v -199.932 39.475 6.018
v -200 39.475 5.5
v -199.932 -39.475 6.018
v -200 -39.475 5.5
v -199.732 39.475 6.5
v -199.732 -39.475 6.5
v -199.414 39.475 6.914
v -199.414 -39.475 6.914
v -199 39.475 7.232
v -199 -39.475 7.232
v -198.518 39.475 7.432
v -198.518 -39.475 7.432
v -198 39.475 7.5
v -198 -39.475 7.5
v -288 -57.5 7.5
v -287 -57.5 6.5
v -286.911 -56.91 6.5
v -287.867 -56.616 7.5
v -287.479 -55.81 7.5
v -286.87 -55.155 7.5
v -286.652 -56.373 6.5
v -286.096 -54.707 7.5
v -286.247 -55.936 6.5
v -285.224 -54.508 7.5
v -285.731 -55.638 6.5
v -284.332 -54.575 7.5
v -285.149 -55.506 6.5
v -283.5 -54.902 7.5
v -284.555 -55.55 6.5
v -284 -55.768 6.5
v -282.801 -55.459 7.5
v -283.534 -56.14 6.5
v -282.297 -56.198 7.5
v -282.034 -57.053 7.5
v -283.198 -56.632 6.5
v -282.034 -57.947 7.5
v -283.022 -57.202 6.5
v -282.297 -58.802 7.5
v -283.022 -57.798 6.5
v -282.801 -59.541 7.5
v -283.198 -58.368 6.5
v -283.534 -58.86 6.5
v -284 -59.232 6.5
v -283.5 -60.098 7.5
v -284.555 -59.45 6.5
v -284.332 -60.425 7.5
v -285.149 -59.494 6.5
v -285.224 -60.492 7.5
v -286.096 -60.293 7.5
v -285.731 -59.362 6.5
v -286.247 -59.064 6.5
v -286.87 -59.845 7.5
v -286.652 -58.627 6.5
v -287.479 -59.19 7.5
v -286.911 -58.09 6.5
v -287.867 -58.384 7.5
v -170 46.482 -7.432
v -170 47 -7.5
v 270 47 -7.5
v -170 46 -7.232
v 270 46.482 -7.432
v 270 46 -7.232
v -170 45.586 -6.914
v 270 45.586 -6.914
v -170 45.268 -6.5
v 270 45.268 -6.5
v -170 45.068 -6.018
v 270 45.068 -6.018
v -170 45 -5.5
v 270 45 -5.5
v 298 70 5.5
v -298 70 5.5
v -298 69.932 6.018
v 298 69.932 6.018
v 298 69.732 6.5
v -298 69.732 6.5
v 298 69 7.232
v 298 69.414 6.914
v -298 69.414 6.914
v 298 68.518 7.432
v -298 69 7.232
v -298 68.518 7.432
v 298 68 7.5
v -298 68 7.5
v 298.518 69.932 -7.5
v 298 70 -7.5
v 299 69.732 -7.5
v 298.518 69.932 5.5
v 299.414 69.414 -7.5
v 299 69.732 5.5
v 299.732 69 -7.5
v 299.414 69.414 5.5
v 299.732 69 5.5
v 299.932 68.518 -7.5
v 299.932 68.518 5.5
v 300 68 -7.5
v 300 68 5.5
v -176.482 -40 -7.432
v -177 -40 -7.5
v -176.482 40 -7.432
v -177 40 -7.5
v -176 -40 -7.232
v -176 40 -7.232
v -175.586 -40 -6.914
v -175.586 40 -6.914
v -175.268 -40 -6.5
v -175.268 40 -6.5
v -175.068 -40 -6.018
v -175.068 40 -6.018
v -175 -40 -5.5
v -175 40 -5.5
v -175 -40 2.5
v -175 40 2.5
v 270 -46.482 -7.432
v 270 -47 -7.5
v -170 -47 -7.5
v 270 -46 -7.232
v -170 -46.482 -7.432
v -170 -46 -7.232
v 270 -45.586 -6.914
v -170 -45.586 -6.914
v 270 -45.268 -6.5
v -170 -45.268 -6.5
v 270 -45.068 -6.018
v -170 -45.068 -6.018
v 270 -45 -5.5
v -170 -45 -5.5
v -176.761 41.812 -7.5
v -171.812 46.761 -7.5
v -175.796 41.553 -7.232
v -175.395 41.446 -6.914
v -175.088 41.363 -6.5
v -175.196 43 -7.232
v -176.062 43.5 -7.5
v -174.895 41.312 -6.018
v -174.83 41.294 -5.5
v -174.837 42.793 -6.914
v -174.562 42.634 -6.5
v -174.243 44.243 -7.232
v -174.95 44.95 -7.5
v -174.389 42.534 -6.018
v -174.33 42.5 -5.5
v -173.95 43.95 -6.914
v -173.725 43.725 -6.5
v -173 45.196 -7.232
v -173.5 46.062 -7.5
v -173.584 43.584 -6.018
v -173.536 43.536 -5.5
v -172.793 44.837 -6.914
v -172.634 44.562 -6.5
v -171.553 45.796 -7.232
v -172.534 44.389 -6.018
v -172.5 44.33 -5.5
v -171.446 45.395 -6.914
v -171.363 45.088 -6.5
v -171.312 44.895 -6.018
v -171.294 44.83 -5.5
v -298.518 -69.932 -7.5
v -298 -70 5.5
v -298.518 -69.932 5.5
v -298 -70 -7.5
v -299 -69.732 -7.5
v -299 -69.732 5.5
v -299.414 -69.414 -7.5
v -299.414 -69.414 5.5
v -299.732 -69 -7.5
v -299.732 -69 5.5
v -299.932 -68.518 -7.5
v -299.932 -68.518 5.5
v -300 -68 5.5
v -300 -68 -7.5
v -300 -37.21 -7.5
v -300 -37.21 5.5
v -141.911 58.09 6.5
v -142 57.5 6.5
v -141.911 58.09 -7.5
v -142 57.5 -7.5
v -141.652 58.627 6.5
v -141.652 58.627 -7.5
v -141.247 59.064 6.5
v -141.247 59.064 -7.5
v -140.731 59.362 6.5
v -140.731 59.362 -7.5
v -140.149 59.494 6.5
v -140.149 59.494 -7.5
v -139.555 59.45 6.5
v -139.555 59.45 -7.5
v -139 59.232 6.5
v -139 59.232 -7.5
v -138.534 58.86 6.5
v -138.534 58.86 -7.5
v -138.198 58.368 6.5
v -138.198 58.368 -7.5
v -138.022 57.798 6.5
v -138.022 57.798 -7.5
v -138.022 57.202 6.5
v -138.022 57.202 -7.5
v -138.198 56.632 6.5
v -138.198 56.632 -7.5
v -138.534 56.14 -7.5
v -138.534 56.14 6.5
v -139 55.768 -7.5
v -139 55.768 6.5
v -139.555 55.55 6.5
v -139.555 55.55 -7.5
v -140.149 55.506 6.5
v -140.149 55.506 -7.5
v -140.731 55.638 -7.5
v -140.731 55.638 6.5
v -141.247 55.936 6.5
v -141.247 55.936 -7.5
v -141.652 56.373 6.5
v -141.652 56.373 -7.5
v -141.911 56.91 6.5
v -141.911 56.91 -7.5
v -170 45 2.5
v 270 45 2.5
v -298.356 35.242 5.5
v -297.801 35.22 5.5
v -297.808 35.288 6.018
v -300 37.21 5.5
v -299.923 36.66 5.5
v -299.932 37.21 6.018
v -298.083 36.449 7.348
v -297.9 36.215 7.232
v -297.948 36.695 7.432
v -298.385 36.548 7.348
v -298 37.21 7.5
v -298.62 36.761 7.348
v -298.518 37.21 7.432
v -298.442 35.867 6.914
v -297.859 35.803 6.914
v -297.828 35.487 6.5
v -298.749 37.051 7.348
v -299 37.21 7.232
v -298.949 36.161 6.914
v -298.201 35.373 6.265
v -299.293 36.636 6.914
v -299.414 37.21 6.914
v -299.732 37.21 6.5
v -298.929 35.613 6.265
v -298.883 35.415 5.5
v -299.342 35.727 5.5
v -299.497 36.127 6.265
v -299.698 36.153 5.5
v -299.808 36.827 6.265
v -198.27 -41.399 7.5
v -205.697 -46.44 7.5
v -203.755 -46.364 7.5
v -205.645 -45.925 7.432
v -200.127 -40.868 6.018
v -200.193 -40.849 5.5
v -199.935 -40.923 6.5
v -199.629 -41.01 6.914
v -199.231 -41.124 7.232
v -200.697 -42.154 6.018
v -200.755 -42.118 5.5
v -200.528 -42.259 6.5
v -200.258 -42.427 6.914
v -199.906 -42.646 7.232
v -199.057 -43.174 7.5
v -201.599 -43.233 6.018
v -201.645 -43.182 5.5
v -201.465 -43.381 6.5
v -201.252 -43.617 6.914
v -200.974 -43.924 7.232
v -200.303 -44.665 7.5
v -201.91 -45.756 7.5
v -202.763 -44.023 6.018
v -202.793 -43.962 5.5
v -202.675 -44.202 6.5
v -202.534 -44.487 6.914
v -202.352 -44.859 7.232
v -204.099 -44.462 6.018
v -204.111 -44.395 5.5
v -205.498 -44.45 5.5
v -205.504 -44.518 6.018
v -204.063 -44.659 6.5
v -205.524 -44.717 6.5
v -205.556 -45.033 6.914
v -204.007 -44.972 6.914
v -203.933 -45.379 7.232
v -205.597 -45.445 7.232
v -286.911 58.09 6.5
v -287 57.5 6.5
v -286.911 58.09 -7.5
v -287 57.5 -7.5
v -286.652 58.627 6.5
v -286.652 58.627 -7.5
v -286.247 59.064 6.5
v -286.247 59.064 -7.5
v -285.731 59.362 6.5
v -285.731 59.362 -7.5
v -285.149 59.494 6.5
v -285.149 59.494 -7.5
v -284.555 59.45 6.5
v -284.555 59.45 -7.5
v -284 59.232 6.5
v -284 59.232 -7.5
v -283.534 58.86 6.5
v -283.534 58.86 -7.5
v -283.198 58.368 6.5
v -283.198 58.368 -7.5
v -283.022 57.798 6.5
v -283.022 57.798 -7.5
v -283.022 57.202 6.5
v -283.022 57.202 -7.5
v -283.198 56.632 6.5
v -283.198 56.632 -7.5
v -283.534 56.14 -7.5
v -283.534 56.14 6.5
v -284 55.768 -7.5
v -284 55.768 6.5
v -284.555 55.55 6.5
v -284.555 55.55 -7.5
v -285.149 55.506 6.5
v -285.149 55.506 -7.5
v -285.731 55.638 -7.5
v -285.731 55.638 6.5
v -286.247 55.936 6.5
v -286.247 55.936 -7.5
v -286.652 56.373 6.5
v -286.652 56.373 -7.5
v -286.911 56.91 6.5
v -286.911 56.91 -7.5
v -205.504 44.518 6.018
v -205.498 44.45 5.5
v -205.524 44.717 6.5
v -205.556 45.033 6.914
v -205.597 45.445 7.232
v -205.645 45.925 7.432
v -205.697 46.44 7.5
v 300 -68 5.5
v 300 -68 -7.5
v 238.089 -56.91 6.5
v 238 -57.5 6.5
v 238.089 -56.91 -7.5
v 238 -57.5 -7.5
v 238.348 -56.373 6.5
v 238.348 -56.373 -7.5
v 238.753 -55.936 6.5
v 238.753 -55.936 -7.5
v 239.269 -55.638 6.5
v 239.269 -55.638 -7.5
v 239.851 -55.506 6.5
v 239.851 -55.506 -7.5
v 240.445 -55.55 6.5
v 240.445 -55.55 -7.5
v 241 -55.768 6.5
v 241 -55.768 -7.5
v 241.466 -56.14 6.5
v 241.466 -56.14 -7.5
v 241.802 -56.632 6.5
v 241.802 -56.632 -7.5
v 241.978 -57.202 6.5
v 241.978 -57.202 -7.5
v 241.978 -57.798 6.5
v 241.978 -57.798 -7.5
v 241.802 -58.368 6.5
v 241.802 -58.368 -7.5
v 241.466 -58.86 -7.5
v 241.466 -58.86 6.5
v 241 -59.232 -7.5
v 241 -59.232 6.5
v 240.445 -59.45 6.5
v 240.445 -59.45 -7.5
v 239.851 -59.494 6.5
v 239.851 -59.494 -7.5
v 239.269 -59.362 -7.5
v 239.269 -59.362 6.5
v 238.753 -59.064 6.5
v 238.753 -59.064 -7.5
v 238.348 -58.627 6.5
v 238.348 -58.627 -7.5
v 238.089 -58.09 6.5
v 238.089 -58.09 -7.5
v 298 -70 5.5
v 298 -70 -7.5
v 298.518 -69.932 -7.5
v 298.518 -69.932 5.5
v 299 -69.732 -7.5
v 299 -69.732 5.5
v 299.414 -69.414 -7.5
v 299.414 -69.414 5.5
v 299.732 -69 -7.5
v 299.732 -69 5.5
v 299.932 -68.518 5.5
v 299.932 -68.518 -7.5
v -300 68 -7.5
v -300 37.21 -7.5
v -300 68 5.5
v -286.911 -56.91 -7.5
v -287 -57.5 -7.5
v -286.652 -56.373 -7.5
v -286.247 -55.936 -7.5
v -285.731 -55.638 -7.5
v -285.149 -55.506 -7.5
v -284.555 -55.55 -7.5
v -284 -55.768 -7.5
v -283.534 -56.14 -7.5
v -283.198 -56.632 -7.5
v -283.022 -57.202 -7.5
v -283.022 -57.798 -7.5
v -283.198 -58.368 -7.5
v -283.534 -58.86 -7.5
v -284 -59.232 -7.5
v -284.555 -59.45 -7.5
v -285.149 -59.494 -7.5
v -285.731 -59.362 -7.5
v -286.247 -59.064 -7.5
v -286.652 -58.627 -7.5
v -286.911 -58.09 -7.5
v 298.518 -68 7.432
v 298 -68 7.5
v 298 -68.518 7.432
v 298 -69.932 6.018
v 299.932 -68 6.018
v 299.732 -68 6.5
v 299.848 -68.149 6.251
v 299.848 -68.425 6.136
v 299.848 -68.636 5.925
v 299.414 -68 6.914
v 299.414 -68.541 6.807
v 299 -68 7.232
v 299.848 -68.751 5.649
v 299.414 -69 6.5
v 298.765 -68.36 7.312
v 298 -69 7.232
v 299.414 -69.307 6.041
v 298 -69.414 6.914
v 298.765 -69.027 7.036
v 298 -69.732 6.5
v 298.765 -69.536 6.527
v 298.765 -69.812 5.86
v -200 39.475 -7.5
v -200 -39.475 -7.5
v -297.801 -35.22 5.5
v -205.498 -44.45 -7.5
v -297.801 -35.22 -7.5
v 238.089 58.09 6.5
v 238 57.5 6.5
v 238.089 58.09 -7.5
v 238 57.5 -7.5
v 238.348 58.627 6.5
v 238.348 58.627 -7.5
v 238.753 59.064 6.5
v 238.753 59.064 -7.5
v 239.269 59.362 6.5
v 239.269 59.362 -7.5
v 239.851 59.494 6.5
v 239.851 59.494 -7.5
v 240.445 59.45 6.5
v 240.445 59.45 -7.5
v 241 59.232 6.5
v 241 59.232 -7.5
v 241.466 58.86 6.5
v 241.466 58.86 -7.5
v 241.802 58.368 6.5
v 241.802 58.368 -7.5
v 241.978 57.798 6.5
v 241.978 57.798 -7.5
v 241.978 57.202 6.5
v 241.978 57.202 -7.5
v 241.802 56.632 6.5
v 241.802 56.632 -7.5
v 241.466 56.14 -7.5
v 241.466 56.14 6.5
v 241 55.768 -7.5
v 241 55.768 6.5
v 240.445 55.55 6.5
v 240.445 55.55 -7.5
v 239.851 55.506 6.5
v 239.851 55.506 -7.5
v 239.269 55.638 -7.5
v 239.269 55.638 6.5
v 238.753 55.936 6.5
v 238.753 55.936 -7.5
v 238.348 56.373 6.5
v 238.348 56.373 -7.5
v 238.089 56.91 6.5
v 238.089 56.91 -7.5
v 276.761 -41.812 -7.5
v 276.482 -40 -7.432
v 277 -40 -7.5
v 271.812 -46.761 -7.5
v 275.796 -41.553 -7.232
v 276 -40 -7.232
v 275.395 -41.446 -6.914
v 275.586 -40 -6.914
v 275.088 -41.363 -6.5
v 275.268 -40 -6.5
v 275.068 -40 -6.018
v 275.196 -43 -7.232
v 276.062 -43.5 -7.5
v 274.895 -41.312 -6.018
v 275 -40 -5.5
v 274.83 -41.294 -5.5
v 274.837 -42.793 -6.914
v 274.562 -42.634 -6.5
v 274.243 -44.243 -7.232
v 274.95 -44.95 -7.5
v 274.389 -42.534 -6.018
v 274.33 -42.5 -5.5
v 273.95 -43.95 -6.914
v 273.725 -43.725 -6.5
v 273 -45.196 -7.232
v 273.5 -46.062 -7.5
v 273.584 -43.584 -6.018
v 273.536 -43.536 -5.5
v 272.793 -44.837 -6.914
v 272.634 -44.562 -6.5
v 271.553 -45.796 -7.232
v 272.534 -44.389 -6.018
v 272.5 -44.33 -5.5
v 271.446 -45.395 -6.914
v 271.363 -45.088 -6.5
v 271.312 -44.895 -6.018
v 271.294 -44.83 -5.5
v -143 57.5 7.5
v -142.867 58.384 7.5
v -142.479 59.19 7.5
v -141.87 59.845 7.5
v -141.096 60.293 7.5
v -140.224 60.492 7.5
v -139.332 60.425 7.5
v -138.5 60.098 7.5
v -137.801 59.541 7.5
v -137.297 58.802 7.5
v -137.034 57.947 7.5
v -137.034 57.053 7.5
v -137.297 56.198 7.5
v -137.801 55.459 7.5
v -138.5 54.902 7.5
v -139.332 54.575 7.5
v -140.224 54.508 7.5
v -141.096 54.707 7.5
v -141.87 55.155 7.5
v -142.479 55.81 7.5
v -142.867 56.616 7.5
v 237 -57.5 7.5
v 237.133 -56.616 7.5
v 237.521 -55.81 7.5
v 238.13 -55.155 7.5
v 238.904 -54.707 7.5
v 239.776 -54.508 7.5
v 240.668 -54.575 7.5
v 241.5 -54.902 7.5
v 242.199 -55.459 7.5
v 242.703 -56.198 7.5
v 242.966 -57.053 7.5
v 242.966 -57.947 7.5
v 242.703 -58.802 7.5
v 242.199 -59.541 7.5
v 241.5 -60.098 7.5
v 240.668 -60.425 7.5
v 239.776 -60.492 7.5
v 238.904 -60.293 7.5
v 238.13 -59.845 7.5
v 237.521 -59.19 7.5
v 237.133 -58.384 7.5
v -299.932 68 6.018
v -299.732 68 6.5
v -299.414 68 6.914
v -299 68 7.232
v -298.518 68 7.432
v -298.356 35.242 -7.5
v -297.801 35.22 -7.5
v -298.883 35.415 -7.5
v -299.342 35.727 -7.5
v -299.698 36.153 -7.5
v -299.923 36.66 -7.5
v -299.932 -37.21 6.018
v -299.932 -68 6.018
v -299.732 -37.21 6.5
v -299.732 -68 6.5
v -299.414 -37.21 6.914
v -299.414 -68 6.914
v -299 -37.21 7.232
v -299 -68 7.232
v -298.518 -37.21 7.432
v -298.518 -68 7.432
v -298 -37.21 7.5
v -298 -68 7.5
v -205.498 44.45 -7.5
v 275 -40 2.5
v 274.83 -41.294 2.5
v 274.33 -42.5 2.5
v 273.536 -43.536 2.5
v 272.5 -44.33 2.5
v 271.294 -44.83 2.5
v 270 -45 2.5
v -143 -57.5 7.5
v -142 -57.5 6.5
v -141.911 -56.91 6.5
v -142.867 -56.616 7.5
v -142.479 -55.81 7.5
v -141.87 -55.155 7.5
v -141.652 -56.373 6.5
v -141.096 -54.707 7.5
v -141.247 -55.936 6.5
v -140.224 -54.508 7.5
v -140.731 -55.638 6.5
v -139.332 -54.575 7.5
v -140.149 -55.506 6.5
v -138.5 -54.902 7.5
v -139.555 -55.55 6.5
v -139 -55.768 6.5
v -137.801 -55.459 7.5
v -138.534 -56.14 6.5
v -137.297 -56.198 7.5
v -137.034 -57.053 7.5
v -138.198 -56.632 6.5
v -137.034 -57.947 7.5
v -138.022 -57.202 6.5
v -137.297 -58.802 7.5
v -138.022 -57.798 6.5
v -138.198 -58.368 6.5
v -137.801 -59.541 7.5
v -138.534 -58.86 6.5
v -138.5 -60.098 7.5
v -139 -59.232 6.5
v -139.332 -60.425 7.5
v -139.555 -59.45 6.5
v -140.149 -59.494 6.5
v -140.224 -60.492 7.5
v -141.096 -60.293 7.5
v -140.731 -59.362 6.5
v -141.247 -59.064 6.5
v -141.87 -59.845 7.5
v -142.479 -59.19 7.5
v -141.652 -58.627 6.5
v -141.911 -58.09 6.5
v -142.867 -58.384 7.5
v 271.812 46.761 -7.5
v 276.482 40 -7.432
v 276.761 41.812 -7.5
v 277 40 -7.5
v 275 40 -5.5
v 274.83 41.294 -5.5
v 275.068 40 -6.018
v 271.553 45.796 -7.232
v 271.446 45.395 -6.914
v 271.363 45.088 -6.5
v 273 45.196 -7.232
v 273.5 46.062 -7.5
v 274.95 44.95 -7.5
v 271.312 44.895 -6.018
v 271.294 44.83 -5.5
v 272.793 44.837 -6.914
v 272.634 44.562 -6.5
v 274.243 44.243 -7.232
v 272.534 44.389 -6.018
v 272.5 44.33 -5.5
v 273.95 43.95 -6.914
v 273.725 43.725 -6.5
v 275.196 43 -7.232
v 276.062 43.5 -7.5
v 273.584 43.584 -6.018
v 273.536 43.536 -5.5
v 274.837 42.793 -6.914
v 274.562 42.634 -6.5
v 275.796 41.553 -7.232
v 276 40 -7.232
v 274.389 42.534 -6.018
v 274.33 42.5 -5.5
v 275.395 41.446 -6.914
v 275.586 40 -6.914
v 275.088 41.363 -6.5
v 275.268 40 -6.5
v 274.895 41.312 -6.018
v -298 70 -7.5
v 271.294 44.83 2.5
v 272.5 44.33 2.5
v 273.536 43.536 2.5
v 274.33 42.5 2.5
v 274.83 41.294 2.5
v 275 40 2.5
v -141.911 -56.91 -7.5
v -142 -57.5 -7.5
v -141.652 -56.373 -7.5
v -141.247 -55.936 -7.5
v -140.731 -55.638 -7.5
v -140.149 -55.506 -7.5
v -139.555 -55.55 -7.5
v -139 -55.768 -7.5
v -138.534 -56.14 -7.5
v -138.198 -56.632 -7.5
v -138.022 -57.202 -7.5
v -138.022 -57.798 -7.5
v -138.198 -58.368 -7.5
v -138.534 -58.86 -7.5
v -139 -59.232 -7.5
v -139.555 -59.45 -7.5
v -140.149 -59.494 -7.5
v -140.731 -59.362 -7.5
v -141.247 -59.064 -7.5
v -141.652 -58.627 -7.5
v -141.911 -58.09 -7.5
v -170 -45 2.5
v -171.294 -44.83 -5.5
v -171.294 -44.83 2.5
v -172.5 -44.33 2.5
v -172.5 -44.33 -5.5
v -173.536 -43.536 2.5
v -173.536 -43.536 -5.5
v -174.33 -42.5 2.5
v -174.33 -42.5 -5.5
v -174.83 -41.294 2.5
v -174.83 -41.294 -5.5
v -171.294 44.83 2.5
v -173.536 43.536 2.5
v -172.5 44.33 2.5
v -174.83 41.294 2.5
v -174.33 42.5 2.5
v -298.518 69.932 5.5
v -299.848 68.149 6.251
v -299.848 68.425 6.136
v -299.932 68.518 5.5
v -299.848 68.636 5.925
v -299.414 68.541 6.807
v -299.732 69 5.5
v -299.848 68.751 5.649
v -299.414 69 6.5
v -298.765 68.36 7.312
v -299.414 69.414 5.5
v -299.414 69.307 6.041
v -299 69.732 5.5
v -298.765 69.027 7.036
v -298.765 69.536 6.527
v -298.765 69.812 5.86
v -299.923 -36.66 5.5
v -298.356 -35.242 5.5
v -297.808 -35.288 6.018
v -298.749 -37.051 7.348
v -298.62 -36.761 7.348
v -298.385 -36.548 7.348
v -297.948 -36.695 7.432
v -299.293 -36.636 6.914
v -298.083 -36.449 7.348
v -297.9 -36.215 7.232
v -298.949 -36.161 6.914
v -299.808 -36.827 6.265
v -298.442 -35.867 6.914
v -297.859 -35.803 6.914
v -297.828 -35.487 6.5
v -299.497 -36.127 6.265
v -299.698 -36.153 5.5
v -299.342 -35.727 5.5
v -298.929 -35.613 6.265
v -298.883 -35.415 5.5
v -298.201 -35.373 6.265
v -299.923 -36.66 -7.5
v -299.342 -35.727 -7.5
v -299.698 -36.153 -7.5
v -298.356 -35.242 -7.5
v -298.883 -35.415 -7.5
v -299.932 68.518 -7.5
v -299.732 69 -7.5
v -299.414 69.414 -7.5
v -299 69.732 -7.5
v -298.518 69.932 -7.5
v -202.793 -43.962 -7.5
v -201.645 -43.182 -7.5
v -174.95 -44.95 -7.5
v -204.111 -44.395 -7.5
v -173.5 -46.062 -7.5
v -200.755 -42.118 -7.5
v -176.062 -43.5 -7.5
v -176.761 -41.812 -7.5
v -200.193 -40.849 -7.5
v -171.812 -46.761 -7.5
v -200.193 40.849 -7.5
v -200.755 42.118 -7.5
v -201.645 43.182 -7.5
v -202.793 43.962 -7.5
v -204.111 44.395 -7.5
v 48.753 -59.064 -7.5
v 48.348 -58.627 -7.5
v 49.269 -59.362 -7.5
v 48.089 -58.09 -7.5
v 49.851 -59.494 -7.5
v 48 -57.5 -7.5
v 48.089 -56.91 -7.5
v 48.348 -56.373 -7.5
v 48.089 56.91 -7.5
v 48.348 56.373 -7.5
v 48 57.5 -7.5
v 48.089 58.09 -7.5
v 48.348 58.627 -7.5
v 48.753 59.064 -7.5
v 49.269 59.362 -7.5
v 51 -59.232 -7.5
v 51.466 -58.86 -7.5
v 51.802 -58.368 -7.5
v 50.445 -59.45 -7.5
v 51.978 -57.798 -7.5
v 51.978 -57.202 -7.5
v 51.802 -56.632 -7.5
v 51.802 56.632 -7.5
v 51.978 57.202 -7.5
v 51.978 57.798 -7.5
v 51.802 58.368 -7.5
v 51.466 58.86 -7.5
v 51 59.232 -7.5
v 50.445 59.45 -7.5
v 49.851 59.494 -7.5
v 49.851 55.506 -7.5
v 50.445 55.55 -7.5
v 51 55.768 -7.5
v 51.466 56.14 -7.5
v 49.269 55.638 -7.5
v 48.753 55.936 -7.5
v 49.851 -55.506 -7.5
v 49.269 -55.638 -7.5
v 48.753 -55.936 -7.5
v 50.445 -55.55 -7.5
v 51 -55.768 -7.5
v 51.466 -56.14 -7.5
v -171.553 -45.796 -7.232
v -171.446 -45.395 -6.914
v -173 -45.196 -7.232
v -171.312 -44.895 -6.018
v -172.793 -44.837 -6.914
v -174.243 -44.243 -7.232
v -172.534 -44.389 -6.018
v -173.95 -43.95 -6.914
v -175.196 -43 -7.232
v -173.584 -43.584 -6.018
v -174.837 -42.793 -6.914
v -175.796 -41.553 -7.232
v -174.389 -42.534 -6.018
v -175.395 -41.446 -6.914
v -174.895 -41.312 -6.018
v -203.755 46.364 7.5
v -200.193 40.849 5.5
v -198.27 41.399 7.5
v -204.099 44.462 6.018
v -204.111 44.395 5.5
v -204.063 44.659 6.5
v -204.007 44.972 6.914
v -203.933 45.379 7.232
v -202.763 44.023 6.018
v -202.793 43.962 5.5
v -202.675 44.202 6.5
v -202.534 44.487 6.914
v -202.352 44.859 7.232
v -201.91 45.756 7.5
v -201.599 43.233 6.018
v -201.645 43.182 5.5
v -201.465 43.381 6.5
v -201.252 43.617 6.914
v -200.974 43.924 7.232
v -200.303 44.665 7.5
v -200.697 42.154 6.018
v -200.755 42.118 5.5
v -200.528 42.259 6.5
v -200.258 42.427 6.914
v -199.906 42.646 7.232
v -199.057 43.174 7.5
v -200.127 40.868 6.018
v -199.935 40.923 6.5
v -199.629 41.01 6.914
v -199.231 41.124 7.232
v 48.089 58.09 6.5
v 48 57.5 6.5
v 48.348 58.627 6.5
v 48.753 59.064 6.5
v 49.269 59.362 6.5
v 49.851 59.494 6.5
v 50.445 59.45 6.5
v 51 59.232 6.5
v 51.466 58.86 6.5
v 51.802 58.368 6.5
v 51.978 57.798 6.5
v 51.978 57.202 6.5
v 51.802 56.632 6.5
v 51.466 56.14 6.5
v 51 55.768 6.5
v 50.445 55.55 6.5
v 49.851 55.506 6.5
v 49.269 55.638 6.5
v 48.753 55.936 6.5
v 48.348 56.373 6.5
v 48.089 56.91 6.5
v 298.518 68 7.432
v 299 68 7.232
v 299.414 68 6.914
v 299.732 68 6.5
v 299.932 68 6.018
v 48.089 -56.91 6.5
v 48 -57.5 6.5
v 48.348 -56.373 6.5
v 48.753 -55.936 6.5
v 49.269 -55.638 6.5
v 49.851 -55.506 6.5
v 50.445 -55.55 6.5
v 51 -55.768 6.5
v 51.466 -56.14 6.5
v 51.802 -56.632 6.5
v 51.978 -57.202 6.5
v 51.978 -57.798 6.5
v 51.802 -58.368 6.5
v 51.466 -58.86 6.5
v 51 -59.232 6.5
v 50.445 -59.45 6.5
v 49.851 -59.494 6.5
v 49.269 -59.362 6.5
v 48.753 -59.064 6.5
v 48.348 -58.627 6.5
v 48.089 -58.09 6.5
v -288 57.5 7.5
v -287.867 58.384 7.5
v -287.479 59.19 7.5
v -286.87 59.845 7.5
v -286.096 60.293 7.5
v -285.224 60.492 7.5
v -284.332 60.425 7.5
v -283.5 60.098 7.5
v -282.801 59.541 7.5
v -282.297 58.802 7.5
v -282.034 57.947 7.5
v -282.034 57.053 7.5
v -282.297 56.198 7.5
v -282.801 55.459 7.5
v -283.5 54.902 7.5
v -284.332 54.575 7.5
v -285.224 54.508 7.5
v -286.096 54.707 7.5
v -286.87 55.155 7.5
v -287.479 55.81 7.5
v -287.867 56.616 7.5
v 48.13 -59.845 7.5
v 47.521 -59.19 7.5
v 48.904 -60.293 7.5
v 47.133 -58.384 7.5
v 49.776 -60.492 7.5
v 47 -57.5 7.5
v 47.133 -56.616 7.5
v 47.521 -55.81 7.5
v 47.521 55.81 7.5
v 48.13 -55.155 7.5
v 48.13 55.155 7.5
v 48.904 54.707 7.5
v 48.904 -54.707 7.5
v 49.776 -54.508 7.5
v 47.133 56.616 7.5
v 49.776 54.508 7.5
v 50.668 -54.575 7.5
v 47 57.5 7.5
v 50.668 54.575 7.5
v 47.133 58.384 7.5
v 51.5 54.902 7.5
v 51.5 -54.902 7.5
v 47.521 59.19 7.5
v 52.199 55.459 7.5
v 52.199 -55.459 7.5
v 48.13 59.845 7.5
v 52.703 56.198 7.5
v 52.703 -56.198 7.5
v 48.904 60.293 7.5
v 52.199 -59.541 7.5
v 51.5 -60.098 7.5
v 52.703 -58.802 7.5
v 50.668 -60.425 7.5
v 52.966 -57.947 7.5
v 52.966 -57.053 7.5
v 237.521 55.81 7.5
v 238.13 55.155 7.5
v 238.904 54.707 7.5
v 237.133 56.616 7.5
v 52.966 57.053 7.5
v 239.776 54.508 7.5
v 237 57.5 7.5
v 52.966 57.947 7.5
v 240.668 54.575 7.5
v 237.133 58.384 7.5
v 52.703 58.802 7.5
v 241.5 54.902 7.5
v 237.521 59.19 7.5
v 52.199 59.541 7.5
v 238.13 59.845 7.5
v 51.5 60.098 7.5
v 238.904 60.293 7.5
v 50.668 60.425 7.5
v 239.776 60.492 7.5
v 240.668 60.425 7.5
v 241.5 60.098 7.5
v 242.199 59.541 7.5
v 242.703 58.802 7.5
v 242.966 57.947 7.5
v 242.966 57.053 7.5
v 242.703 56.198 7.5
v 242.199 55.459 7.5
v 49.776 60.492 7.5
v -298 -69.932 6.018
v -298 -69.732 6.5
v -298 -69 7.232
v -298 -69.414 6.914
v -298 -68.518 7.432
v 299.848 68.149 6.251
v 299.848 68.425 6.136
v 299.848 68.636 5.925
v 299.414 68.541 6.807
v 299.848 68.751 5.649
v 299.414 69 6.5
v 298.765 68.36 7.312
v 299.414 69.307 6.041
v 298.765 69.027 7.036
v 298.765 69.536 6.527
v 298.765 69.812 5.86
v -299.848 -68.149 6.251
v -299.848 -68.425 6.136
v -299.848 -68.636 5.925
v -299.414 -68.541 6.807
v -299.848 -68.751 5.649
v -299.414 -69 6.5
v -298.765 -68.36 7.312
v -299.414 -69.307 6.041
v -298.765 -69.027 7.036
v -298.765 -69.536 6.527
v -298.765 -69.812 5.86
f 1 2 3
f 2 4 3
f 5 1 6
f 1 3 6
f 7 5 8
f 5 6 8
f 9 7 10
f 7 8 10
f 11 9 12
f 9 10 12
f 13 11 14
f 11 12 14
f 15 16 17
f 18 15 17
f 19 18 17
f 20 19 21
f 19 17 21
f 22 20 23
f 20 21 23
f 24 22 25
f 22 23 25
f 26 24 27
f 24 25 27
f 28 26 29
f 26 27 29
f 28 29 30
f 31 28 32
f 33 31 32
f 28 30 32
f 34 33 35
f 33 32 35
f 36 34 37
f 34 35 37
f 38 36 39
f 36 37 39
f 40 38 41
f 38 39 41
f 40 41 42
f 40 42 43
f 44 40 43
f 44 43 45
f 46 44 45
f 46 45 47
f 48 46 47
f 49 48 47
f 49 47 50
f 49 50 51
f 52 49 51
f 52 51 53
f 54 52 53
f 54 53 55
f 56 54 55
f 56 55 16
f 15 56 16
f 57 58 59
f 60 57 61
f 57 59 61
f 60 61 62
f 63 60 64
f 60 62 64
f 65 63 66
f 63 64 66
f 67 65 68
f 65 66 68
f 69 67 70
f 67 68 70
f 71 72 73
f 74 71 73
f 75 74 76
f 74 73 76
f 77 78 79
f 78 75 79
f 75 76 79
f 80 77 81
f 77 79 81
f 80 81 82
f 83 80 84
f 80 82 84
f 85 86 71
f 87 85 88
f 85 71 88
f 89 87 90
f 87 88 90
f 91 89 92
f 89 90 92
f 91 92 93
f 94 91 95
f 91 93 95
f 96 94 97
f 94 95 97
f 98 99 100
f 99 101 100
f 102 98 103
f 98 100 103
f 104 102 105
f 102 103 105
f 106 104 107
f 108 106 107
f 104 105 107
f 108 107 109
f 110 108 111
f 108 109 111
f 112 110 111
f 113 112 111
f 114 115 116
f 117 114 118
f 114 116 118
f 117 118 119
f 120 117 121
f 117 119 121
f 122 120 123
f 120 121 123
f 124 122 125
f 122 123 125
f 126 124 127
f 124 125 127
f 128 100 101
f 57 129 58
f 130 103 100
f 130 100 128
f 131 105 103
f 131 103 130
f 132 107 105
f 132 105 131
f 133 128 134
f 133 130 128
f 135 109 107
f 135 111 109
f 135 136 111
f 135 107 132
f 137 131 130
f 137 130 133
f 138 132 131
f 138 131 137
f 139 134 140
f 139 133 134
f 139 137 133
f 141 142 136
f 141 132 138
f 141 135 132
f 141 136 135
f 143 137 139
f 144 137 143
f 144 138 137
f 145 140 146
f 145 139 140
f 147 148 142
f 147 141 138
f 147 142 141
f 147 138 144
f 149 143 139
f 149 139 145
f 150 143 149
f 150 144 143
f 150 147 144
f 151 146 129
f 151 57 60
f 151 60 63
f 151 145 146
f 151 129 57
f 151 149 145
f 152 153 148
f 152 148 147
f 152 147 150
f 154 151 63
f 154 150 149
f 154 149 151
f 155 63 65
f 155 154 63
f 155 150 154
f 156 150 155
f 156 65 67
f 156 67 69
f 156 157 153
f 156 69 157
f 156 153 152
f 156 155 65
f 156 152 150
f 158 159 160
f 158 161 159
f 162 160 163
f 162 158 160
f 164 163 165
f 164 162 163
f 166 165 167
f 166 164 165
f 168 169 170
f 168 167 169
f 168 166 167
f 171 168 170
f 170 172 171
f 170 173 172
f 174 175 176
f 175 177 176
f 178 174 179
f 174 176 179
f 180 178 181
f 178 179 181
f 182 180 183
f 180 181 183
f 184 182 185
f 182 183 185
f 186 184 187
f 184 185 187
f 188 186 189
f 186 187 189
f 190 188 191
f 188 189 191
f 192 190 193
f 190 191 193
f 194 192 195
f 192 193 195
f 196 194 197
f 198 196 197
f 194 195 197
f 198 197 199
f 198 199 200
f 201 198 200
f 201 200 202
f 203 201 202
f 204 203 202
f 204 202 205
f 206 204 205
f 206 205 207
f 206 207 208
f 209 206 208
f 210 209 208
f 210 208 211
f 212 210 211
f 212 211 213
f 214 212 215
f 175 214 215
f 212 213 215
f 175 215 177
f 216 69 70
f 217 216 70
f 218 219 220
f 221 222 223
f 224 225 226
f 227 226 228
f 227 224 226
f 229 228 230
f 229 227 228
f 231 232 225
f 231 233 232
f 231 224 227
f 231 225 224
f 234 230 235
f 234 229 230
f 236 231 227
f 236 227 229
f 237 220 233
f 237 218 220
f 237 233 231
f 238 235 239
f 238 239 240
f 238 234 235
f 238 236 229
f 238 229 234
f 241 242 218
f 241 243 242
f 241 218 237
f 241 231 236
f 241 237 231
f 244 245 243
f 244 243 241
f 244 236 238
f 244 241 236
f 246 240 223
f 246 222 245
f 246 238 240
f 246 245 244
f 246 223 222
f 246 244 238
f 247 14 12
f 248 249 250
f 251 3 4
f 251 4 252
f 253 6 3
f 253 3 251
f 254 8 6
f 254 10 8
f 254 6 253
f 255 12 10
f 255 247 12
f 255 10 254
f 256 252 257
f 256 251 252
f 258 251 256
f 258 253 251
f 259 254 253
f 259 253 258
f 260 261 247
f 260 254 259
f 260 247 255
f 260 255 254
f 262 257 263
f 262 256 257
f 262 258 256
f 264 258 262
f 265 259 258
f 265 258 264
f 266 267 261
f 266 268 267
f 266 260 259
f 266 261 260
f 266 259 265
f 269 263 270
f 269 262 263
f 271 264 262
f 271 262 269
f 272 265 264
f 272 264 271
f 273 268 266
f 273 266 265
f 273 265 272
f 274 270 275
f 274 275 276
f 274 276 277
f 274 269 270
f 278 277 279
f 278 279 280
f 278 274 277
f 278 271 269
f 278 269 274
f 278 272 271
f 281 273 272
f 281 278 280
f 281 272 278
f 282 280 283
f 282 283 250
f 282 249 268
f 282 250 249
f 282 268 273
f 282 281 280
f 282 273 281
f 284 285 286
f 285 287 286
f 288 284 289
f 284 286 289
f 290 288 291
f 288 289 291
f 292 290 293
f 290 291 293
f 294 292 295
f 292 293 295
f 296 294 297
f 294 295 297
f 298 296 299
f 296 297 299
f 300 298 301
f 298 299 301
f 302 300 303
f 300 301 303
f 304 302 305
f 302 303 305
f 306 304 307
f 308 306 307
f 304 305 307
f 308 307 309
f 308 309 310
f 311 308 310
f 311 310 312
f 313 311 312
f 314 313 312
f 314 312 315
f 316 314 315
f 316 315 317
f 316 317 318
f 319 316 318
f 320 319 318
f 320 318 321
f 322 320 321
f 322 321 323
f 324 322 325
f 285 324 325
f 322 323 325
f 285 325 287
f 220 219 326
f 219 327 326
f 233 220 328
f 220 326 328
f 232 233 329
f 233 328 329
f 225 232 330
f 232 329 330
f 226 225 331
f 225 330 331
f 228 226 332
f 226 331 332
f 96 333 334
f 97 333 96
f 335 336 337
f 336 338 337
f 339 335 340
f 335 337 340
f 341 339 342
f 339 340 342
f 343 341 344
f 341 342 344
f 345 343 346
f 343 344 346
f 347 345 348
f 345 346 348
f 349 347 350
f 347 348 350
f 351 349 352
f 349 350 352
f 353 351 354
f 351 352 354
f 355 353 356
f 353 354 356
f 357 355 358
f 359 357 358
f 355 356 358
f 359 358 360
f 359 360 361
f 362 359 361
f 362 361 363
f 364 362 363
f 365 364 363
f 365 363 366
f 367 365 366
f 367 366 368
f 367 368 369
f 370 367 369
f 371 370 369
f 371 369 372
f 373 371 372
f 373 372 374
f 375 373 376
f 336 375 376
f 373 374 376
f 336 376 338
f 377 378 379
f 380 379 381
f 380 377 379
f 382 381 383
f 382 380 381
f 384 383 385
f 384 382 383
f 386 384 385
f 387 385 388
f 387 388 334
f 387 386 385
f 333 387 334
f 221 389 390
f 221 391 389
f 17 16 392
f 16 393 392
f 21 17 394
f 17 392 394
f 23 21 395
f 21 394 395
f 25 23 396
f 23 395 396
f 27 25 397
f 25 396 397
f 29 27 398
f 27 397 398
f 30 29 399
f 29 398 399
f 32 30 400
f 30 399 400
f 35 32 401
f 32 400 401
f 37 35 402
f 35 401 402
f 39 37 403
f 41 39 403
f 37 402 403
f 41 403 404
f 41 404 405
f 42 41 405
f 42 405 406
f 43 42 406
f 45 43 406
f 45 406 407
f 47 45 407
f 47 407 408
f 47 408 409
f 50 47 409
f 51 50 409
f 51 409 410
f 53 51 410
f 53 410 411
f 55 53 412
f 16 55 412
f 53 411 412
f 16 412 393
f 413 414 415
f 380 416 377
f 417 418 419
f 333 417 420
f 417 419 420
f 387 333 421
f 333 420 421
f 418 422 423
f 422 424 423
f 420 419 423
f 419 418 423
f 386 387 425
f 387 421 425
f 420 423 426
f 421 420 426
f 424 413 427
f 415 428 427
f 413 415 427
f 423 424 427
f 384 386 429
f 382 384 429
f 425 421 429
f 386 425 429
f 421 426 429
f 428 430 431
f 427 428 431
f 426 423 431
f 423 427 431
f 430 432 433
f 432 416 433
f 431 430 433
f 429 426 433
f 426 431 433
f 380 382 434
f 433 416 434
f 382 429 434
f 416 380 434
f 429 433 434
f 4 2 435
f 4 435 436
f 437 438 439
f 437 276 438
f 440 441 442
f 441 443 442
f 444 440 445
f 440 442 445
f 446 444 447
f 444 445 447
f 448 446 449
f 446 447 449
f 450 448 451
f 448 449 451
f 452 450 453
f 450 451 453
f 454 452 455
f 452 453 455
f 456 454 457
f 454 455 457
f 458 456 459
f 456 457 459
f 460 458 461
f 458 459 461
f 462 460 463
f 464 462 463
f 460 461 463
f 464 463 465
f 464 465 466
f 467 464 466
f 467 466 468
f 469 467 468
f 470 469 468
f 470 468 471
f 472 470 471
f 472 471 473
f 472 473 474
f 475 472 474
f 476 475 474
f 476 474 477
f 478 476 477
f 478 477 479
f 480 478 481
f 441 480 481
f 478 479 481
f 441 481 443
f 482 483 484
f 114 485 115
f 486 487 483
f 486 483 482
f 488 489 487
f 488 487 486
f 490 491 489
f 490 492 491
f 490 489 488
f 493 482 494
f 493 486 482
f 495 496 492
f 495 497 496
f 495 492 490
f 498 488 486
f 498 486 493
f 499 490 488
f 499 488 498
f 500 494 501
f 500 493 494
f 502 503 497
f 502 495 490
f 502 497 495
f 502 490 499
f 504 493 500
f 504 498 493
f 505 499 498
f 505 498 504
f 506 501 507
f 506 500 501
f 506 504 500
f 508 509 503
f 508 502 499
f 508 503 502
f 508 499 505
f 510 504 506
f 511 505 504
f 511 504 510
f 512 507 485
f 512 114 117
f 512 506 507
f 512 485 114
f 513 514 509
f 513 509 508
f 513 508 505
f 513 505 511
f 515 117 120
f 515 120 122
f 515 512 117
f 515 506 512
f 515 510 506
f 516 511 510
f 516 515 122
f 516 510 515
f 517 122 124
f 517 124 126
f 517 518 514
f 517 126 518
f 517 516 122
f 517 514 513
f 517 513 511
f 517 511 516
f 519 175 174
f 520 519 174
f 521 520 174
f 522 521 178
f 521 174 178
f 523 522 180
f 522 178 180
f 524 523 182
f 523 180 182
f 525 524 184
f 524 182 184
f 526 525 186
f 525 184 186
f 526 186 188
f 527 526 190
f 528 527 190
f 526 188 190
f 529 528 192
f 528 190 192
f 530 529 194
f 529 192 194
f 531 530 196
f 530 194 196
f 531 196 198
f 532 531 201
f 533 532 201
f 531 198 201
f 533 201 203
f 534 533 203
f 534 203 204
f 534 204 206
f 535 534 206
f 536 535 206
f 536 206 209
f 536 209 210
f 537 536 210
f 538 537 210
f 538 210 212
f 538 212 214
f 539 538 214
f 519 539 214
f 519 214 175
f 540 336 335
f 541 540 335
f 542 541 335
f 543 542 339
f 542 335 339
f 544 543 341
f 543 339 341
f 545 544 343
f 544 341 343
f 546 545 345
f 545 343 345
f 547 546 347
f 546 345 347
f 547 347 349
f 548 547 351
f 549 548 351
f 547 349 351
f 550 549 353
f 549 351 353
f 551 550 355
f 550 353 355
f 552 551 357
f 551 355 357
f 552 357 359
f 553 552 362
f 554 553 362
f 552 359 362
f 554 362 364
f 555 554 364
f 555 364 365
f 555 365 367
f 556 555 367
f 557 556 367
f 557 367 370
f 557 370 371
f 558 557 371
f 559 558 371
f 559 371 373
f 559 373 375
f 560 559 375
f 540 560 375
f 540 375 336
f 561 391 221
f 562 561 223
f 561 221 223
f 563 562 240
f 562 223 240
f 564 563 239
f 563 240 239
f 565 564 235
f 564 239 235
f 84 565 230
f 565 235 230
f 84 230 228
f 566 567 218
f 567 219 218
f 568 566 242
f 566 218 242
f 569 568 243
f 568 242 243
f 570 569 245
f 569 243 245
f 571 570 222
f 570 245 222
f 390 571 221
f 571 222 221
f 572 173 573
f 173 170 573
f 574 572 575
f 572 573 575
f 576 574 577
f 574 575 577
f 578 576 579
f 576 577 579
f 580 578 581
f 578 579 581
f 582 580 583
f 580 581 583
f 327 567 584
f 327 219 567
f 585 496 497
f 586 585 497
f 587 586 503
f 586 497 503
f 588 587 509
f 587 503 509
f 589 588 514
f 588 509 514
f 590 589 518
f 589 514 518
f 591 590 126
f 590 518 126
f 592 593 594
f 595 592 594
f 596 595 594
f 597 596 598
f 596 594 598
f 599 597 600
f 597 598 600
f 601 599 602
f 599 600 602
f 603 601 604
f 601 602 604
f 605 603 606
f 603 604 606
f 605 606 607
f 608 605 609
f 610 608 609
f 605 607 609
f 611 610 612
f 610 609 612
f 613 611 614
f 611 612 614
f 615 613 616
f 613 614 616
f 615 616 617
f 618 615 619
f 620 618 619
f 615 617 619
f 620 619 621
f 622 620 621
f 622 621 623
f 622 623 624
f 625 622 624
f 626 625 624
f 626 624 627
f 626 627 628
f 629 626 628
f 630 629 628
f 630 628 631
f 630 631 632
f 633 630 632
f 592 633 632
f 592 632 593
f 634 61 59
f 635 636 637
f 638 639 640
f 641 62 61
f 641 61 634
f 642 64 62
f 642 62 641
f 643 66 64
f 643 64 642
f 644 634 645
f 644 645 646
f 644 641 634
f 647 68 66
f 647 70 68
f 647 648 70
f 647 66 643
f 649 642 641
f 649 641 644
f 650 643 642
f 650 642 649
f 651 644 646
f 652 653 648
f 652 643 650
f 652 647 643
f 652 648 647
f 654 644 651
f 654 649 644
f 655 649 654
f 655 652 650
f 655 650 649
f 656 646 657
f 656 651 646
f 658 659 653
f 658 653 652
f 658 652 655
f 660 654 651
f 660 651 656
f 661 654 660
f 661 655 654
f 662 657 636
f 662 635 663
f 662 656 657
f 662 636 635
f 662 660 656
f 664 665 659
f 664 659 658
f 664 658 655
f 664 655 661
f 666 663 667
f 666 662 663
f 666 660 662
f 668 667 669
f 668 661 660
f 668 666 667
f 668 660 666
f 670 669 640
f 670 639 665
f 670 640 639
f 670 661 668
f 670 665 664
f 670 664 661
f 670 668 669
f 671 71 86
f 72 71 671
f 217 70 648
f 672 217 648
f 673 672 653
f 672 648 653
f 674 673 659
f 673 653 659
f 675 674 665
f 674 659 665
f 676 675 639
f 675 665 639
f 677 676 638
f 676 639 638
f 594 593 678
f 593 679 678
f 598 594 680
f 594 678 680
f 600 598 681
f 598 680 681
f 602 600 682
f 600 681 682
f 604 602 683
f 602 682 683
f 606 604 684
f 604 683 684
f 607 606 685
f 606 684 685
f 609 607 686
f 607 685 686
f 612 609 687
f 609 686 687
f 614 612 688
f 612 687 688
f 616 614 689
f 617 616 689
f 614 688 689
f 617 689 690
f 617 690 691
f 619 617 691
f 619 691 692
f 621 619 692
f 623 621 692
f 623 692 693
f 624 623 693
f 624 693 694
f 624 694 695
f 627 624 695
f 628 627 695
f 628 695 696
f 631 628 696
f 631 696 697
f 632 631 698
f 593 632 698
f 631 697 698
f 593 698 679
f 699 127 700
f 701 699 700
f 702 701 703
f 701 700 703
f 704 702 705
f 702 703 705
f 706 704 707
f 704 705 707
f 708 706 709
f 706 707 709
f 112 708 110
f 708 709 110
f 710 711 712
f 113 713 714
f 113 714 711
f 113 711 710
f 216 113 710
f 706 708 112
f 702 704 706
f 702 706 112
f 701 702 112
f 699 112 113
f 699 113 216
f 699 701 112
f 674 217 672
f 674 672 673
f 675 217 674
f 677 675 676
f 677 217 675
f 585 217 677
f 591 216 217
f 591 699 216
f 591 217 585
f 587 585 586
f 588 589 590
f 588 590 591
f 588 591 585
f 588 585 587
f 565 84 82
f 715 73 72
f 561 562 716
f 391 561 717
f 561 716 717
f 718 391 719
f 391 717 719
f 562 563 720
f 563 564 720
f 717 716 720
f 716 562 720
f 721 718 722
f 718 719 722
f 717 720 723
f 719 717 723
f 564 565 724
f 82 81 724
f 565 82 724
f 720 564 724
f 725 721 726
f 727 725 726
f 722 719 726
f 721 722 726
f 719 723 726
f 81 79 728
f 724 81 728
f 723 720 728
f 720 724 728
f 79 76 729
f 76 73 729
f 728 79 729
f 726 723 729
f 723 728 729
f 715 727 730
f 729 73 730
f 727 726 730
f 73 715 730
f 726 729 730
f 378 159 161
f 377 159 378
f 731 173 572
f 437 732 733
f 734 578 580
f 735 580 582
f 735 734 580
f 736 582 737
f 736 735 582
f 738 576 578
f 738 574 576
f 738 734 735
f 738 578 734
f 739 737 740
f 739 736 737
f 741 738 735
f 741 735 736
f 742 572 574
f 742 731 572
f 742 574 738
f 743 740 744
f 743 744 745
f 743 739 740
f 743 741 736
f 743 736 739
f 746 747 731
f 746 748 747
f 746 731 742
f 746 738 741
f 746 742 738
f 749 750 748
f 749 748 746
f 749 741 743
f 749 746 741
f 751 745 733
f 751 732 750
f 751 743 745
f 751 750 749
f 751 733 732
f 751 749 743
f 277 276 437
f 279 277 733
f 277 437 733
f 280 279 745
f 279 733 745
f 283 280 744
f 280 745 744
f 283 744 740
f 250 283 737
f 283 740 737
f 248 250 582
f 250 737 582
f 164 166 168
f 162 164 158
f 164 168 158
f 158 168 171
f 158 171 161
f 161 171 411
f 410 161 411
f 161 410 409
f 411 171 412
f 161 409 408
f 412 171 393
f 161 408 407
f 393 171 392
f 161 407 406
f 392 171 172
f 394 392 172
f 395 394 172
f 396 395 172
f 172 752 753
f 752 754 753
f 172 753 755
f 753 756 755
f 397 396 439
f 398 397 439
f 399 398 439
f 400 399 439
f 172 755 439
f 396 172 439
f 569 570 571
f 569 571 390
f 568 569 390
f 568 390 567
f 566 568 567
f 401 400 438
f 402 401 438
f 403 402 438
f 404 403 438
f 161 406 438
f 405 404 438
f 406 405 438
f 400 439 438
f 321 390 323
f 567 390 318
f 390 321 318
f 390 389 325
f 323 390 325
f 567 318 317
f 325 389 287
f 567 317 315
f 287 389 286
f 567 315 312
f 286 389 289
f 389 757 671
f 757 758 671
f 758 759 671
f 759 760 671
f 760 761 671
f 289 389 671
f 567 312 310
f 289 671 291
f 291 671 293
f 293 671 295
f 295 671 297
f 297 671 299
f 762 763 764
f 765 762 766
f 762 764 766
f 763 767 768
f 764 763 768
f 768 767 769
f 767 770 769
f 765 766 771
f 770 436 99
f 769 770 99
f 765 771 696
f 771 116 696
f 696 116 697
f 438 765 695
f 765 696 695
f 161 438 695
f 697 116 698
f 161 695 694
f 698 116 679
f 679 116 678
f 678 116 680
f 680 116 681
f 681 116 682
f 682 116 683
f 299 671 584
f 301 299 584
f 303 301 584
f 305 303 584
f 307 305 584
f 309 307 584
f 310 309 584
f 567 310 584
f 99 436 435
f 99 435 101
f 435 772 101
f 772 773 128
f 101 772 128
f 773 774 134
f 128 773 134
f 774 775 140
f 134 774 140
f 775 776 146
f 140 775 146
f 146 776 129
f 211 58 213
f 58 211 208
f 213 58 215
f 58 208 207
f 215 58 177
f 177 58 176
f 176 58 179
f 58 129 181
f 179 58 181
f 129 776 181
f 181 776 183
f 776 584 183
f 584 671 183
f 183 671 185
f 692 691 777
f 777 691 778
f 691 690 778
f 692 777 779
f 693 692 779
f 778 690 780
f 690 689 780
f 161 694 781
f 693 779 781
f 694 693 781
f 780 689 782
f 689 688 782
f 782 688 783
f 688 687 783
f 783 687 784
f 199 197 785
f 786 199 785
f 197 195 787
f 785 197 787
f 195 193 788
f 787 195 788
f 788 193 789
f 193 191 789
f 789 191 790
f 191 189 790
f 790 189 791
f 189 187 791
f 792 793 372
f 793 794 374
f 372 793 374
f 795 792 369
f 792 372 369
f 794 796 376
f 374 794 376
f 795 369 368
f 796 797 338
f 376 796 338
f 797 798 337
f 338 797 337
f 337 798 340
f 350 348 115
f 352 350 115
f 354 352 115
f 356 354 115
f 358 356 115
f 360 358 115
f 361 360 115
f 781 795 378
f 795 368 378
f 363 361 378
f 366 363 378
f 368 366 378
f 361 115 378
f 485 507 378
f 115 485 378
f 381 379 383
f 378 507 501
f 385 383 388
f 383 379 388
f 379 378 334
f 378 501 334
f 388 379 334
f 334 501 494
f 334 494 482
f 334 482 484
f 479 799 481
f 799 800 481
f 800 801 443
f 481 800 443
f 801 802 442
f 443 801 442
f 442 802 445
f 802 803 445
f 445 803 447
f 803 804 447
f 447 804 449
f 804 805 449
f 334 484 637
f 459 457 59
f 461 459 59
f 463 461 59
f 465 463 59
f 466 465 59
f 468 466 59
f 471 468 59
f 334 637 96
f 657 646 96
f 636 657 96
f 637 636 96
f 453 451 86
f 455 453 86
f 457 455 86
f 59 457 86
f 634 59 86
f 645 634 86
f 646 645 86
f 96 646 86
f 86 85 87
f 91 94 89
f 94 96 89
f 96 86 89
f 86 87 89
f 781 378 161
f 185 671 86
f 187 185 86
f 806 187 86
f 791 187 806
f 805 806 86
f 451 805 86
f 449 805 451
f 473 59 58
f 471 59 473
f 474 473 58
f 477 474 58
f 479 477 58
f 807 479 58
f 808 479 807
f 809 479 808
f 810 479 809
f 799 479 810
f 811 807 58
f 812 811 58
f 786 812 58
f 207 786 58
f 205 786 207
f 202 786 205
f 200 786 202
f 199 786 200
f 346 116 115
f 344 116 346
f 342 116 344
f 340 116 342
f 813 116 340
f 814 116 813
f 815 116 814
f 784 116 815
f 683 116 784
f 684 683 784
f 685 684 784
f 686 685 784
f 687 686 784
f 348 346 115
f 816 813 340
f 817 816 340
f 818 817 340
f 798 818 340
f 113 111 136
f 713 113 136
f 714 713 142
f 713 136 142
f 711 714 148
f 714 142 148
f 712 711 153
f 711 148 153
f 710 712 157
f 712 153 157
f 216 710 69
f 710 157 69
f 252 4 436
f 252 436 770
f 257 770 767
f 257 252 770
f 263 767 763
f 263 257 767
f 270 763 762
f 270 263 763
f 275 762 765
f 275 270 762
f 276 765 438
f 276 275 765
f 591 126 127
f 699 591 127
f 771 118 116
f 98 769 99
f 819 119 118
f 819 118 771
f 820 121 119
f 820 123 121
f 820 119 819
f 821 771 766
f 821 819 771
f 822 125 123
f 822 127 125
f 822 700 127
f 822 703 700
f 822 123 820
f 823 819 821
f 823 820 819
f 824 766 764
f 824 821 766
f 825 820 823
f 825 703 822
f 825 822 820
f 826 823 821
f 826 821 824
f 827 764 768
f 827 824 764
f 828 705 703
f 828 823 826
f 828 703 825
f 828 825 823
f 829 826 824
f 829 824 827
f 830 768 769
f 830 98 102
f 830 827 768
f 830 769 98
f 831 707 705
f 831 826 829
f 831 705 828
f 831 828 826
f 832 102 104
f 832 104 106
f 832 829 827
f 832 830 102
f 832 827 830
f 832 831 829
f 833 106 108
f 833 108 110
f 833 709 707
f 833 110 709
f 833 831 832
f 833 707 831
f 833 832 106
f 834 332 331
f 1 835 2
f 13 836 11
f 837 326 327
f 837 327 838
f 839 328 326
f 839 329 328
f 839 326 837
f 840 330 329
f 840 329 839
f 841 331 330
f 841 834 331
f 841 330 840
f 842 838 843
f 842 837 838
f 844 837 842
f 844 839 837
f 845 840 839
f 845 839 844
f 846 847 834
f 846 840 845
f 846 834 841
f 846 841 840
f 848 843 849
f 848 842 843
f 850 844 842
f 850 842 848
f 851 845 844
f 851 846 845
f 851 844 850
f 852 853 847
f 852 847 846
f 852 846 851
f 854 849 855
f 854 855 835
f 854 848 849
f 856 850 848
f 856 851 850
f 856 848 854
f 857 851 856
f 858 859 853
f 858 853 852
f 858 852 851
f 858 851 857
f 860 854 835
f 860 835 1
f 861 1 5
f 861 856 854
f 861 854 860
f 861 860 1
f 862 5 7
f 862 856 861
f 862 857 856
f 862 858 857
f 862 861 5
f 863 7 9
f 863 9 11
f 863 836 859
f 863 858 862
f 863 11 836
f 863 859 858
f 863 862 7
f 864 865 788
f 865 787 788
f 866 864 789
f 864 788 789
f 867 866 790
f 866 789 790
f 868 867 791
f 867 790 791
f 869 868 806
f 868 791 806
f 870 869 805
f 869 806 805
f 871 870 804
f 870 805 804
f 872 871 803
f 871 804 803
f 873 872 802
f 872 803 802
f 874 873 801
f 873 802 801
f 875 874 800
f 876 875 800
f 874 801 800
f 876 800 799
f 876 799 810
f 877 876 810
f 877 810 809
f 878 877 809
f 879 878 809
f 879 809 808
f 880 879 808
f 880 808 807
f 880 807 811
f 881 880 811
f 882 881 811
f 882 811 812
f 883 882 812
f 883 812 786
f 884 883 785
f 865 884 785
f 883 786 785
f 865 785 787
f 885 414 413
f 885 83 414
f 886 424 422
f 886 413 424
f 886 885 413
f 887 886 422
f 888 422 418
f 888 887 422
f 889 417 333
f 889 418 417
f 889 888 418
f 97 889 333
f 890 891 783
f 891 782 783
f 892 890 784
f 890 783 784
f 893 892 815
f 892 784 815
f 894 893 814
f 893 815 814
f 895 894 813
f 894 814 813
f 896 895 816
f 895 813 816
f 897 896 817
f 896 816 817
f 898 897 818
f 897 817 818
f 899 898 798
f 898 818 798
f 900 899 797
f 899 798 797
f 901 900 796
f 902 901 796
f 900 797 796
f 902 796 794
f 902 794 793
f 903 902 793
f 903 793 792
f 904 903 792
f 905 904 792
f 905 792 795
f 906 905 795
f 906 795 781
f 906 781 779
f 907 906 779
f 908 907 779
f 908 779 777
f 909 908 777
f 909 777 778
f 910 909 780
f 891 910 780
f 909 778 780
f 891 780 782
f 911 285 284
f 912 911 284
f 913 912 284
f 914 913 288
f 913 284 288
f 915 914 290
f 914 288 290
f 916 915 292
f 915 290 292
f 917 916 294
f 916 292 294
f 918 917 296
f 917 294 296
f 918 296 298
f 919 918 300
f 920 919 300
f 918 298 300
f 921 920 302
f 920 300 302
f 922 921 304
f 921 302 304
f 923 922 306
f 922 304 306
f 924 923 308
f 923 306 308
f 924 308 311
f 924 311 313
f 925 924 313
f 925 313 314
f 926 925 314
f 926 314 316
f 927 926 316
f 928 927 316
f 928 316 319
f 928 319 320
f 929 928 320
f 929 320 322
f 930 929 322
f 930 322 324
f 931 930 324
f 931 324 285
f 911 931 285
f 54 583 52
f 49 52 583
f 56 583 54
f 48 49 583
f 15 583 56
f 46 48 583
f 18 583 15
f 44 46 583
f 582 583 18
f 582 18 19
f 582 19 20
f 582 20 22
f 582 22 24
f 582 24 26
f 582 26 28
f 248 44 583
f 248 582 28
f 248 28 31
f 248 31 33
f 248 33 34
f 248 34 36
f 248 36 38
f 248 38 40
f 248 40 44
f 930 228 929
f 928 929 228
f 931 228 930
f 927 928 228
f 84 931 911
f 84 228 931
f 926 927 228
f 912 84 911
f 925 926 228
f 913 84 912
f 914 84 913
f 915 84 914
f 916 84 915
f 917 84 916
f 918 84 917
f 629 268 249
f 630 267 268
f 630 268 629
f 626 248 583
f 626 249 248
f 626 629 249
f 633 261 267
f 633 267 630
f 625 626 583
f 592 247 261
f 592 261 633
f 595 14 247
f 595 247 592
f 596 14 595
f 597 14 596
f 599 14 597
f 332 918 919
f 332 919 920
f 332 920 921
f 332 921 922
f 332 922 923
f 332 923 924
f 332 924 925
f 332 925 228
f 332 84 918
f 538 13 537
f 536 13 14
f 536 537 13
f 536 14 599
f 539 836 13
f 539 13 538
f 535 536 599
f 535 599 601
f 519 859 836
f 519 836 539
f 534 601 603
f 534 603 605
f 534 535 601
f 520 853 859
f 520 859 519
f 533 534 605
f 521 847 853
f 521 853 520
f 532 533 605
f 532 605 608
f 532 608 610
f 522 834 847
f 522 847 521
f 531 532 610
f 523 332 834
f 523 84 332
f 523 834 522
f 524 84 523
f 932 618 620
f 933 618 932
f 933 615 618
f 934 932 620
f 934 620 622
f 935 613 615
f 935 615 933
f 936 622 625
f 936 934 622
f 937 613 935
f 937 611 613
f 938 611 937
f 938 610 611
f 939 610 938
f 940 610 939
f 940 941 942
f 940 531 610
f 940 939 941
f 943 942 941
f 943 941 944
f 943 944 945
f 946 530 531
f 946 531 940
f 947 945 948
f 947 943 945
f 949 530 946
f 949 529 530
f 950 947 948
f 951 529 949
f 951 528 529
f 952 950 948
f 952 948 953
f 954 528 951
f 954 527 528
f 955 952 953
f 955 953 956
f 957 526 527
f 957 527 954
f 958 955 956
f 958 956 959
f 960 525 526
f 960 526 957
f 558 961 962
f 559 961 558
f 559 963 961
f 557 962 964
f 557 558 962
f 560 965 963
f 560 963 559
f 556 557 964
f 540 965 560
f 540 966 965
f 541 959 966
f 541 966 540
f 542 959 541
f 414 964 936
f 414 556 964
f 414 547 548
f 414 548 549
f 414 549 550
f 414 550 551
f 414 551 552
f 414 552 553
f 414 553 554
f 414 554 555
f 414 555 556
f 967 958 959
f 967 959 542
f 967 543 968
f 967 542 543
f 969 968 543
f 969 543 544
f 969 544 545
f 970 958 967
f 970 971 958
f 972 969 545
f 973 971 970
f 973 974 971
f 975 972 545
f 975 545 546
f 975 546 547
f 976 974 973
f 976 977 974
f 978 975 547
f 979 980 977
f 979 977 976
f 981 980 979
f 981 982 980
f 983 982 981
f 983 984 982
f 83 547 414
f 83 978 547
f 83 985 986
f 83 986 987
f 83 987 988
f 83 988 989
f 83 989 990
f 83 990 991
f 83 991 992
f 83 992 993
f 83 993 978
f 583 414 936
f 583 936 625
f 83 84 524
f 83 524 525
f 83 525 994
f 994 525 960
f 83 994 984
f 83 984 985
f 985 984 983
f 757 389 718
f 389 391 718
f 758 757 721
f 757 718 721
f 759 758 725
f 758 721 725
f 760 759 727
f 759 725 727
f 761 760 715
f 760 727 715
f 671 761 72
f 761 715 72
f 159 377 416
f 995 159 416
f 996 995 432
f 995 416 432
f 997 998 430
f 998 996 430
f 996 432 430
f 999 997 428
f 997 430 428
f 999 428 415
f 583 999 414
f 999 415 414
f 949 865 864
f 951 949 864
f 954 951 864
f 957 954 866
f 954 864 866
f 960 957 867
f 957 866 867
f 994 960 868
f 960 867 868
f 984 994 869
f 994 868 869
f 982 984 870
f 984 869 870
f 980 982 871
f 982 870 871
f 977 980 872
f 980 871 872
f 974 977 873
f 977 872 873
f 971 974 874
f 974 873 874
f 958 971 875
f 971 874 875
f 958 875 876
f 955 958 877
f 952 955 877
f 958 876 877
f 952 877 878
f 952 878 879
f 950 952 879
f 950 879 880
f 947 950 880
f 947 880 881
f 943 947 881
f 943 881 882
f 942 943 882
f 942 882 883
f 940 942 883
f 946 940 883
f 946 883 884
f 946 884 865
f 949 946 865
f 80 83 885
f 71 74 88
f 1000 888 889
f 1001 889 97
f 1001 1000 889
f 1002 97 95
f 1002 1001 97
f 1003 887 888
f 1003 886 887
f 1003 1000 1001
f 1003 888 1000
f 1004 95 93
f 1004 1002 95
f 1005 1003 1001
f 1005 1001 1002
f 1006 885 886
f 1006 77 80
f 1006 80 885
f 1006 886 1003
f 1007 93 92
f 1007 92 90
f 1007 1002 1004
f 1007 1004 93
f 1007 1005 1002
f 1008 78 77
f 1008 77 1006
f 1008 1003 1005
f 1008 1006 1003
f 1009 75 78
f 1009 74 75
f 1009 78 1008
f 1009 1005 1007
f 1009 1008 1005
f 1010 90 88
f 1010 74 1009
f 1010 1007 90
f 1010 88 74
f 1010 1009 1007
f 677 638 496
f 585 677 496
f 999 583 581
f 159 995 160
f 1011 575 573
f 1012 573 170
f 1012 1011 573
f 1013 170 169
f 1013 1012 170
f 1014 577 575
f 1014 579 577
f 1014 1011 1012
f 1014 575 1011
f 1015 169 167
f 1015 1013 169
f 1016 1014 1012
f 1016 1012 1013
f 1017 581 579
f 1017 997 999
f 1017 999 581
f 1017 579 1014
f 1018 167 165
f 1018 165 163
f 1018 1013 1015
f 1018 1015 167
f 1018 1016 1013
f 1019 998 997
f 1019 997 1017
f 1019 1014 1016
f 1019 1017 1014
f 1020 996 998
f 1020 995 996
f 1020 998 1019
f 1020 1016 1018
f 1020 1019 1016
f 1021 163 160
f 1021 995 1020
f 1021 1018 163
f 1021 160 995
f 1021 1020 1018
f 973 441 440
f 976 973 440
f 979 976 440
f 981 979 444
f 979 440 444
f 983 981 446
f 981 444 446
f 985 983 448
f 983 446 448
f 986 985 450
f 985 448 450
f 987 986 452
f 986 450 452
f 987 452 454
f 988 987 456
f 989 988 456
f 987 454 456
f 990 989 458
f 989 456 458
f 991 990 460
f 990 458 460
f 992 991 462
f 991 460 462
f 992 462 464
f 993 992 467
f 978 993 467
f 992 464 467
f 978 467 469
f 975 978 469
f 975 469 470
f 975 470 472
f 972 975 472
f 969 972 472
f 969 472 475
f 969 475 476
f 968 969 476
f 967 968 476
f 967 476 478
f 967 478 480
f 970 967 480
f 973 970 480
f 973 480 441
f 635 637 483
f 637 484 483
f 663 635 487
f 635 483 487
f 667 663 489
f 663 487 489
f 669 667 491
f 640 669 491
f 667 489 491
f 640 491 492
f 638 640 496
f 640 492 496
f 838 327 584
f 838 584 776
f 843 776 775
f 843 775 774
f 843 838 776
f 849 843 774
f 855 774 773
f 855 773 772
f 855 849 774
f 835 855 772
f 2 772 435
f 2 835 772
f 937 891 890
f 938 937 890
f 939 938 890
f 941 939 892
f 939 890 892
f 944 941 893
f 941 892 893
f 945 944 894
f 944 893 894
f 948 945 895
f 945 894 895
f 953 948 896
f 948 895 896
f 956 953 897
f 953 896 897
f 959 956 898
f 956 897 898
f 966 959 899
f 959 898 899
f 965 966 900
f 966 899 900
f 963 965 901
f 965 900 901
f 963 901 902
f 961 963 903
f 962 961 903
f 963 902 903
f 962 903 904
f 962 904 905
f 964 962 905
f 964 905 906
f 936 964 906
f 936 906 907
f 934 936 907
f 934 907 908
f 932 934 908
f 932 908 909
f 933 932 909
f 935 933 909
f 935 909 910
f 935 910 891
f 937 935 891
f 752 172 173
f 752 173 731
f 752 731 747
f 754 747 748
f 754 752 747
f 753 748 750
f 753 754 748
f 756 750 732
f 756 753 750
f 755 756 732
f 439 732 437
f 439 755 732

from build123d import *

# Parameters (mm, degrees)
F1_DEPTH       = 7.5
F3_DEPTH       = 10
F5_D           = 4
F5_CSINK_D     = 6
F5_CSINK_ANGLE = 90
F6_R           = 2


# Not quite as in the source:
# - a feature names something its author has since deleted; it is built from what else it names


with BuildPart() as f1:
    # F0 (on Top) → F1 (new body, symmetric)
    with BuildSketch(Plane.XY):
        with BuildLine():
            Line((-300, -70), (300, -70))
            Line((300, -70), (300, 70))
            Line((300, 70), (-300, 70))
            Line((-300, 70), (-300, 35))
            Line((-300, 35), (-205.4975185951, 44.4502481405))
            ThreePointArc((-205.4975185951, 44.4502481405), (-201.6449733962, 43.1823248572), (-200, 39.4750621894))
            Line((-200, 39.4750621894), (-200, 0))
            Line((-200, 0), (-200, -39.4750621894))
            ThreePointArc((-200, -39.4750621894), (-201.6449733962, -43.1823248572), (-205.4975185951, -44.4502481405))
            Line((-205.4975185951, -44.4502481405), (-300, -35))
            Line((-300, -35), (-300, -70))
        make_face()
    extrude(amount=F1_DEPTH, both=True)

    # F2 (on face) → F3 (cut)
    with BuildSketch(Plane(origin=(0, 0, -7.5), x_dir=(1, 0, 0), z_dir=(0, 0, -1))):
        with BuildLine():
            Line((-175, 40), (-175, 0))
            Line((-175, 0), (-175, -40))
            ThreePointArc((-175, -40), (-173.5355339059, -43.5355339059), (-170, -45))
            Line((-170, -45), (270, -45))
            ThreePointArc((270, -45), (273.5355339059, -43.5355339059), (275, -40))
            Line((275, -40), (275, 0))
            Line((275, 0), (275, 40))
            ThreePointArc((275, 40), (273.5355339059, 43.5355339059), (270, 45))
            Line((270, 45), (-170, 45))
            ThreePointArc((-170, 45), (-173.5355339059, 43.5355339059), (-175, 40))
        make_face()
    extrude(amount=-F3_DEPTH, mode=Mode.SUBTRACT)

    # F5 (through all)
    with Locations(Plane.XY.offset(7.5)):
        with Locations((-285, 57.5), (-285, -57.5), (-140, -57.5), (50, -57.5), (240, -57.5), (240, 57.5), (50, 57.5), (-140, 57.5)):
            CounterSinkHole(F5_D / 2, F5_CSINK_D / 2, counter_sink_angle=F5_CSINK_ANGLE)

    # F6
    f6_edges = [f1.edges().sort_by_distance(p)[0] for p in [
        (0, -70, 7.5),
        (-300, -52.5, 7.5),
        (-252.748759, -39.725124, 7.5),
        (0, 70, 7.5),
        (-300, 52.5, 7.5),
        (300, 0, 7.5),
        (-175, 0, -7.5),
        (-300, 35, 0),
        (-300, -70, 0),
        (-300, 70, 0),
        (300, 70, 0),
        (300, -70, 0),
        (-300, -35, 0),
    ]]
    fillet(f6_edges, radius=F6_R)


solid = f1.part
